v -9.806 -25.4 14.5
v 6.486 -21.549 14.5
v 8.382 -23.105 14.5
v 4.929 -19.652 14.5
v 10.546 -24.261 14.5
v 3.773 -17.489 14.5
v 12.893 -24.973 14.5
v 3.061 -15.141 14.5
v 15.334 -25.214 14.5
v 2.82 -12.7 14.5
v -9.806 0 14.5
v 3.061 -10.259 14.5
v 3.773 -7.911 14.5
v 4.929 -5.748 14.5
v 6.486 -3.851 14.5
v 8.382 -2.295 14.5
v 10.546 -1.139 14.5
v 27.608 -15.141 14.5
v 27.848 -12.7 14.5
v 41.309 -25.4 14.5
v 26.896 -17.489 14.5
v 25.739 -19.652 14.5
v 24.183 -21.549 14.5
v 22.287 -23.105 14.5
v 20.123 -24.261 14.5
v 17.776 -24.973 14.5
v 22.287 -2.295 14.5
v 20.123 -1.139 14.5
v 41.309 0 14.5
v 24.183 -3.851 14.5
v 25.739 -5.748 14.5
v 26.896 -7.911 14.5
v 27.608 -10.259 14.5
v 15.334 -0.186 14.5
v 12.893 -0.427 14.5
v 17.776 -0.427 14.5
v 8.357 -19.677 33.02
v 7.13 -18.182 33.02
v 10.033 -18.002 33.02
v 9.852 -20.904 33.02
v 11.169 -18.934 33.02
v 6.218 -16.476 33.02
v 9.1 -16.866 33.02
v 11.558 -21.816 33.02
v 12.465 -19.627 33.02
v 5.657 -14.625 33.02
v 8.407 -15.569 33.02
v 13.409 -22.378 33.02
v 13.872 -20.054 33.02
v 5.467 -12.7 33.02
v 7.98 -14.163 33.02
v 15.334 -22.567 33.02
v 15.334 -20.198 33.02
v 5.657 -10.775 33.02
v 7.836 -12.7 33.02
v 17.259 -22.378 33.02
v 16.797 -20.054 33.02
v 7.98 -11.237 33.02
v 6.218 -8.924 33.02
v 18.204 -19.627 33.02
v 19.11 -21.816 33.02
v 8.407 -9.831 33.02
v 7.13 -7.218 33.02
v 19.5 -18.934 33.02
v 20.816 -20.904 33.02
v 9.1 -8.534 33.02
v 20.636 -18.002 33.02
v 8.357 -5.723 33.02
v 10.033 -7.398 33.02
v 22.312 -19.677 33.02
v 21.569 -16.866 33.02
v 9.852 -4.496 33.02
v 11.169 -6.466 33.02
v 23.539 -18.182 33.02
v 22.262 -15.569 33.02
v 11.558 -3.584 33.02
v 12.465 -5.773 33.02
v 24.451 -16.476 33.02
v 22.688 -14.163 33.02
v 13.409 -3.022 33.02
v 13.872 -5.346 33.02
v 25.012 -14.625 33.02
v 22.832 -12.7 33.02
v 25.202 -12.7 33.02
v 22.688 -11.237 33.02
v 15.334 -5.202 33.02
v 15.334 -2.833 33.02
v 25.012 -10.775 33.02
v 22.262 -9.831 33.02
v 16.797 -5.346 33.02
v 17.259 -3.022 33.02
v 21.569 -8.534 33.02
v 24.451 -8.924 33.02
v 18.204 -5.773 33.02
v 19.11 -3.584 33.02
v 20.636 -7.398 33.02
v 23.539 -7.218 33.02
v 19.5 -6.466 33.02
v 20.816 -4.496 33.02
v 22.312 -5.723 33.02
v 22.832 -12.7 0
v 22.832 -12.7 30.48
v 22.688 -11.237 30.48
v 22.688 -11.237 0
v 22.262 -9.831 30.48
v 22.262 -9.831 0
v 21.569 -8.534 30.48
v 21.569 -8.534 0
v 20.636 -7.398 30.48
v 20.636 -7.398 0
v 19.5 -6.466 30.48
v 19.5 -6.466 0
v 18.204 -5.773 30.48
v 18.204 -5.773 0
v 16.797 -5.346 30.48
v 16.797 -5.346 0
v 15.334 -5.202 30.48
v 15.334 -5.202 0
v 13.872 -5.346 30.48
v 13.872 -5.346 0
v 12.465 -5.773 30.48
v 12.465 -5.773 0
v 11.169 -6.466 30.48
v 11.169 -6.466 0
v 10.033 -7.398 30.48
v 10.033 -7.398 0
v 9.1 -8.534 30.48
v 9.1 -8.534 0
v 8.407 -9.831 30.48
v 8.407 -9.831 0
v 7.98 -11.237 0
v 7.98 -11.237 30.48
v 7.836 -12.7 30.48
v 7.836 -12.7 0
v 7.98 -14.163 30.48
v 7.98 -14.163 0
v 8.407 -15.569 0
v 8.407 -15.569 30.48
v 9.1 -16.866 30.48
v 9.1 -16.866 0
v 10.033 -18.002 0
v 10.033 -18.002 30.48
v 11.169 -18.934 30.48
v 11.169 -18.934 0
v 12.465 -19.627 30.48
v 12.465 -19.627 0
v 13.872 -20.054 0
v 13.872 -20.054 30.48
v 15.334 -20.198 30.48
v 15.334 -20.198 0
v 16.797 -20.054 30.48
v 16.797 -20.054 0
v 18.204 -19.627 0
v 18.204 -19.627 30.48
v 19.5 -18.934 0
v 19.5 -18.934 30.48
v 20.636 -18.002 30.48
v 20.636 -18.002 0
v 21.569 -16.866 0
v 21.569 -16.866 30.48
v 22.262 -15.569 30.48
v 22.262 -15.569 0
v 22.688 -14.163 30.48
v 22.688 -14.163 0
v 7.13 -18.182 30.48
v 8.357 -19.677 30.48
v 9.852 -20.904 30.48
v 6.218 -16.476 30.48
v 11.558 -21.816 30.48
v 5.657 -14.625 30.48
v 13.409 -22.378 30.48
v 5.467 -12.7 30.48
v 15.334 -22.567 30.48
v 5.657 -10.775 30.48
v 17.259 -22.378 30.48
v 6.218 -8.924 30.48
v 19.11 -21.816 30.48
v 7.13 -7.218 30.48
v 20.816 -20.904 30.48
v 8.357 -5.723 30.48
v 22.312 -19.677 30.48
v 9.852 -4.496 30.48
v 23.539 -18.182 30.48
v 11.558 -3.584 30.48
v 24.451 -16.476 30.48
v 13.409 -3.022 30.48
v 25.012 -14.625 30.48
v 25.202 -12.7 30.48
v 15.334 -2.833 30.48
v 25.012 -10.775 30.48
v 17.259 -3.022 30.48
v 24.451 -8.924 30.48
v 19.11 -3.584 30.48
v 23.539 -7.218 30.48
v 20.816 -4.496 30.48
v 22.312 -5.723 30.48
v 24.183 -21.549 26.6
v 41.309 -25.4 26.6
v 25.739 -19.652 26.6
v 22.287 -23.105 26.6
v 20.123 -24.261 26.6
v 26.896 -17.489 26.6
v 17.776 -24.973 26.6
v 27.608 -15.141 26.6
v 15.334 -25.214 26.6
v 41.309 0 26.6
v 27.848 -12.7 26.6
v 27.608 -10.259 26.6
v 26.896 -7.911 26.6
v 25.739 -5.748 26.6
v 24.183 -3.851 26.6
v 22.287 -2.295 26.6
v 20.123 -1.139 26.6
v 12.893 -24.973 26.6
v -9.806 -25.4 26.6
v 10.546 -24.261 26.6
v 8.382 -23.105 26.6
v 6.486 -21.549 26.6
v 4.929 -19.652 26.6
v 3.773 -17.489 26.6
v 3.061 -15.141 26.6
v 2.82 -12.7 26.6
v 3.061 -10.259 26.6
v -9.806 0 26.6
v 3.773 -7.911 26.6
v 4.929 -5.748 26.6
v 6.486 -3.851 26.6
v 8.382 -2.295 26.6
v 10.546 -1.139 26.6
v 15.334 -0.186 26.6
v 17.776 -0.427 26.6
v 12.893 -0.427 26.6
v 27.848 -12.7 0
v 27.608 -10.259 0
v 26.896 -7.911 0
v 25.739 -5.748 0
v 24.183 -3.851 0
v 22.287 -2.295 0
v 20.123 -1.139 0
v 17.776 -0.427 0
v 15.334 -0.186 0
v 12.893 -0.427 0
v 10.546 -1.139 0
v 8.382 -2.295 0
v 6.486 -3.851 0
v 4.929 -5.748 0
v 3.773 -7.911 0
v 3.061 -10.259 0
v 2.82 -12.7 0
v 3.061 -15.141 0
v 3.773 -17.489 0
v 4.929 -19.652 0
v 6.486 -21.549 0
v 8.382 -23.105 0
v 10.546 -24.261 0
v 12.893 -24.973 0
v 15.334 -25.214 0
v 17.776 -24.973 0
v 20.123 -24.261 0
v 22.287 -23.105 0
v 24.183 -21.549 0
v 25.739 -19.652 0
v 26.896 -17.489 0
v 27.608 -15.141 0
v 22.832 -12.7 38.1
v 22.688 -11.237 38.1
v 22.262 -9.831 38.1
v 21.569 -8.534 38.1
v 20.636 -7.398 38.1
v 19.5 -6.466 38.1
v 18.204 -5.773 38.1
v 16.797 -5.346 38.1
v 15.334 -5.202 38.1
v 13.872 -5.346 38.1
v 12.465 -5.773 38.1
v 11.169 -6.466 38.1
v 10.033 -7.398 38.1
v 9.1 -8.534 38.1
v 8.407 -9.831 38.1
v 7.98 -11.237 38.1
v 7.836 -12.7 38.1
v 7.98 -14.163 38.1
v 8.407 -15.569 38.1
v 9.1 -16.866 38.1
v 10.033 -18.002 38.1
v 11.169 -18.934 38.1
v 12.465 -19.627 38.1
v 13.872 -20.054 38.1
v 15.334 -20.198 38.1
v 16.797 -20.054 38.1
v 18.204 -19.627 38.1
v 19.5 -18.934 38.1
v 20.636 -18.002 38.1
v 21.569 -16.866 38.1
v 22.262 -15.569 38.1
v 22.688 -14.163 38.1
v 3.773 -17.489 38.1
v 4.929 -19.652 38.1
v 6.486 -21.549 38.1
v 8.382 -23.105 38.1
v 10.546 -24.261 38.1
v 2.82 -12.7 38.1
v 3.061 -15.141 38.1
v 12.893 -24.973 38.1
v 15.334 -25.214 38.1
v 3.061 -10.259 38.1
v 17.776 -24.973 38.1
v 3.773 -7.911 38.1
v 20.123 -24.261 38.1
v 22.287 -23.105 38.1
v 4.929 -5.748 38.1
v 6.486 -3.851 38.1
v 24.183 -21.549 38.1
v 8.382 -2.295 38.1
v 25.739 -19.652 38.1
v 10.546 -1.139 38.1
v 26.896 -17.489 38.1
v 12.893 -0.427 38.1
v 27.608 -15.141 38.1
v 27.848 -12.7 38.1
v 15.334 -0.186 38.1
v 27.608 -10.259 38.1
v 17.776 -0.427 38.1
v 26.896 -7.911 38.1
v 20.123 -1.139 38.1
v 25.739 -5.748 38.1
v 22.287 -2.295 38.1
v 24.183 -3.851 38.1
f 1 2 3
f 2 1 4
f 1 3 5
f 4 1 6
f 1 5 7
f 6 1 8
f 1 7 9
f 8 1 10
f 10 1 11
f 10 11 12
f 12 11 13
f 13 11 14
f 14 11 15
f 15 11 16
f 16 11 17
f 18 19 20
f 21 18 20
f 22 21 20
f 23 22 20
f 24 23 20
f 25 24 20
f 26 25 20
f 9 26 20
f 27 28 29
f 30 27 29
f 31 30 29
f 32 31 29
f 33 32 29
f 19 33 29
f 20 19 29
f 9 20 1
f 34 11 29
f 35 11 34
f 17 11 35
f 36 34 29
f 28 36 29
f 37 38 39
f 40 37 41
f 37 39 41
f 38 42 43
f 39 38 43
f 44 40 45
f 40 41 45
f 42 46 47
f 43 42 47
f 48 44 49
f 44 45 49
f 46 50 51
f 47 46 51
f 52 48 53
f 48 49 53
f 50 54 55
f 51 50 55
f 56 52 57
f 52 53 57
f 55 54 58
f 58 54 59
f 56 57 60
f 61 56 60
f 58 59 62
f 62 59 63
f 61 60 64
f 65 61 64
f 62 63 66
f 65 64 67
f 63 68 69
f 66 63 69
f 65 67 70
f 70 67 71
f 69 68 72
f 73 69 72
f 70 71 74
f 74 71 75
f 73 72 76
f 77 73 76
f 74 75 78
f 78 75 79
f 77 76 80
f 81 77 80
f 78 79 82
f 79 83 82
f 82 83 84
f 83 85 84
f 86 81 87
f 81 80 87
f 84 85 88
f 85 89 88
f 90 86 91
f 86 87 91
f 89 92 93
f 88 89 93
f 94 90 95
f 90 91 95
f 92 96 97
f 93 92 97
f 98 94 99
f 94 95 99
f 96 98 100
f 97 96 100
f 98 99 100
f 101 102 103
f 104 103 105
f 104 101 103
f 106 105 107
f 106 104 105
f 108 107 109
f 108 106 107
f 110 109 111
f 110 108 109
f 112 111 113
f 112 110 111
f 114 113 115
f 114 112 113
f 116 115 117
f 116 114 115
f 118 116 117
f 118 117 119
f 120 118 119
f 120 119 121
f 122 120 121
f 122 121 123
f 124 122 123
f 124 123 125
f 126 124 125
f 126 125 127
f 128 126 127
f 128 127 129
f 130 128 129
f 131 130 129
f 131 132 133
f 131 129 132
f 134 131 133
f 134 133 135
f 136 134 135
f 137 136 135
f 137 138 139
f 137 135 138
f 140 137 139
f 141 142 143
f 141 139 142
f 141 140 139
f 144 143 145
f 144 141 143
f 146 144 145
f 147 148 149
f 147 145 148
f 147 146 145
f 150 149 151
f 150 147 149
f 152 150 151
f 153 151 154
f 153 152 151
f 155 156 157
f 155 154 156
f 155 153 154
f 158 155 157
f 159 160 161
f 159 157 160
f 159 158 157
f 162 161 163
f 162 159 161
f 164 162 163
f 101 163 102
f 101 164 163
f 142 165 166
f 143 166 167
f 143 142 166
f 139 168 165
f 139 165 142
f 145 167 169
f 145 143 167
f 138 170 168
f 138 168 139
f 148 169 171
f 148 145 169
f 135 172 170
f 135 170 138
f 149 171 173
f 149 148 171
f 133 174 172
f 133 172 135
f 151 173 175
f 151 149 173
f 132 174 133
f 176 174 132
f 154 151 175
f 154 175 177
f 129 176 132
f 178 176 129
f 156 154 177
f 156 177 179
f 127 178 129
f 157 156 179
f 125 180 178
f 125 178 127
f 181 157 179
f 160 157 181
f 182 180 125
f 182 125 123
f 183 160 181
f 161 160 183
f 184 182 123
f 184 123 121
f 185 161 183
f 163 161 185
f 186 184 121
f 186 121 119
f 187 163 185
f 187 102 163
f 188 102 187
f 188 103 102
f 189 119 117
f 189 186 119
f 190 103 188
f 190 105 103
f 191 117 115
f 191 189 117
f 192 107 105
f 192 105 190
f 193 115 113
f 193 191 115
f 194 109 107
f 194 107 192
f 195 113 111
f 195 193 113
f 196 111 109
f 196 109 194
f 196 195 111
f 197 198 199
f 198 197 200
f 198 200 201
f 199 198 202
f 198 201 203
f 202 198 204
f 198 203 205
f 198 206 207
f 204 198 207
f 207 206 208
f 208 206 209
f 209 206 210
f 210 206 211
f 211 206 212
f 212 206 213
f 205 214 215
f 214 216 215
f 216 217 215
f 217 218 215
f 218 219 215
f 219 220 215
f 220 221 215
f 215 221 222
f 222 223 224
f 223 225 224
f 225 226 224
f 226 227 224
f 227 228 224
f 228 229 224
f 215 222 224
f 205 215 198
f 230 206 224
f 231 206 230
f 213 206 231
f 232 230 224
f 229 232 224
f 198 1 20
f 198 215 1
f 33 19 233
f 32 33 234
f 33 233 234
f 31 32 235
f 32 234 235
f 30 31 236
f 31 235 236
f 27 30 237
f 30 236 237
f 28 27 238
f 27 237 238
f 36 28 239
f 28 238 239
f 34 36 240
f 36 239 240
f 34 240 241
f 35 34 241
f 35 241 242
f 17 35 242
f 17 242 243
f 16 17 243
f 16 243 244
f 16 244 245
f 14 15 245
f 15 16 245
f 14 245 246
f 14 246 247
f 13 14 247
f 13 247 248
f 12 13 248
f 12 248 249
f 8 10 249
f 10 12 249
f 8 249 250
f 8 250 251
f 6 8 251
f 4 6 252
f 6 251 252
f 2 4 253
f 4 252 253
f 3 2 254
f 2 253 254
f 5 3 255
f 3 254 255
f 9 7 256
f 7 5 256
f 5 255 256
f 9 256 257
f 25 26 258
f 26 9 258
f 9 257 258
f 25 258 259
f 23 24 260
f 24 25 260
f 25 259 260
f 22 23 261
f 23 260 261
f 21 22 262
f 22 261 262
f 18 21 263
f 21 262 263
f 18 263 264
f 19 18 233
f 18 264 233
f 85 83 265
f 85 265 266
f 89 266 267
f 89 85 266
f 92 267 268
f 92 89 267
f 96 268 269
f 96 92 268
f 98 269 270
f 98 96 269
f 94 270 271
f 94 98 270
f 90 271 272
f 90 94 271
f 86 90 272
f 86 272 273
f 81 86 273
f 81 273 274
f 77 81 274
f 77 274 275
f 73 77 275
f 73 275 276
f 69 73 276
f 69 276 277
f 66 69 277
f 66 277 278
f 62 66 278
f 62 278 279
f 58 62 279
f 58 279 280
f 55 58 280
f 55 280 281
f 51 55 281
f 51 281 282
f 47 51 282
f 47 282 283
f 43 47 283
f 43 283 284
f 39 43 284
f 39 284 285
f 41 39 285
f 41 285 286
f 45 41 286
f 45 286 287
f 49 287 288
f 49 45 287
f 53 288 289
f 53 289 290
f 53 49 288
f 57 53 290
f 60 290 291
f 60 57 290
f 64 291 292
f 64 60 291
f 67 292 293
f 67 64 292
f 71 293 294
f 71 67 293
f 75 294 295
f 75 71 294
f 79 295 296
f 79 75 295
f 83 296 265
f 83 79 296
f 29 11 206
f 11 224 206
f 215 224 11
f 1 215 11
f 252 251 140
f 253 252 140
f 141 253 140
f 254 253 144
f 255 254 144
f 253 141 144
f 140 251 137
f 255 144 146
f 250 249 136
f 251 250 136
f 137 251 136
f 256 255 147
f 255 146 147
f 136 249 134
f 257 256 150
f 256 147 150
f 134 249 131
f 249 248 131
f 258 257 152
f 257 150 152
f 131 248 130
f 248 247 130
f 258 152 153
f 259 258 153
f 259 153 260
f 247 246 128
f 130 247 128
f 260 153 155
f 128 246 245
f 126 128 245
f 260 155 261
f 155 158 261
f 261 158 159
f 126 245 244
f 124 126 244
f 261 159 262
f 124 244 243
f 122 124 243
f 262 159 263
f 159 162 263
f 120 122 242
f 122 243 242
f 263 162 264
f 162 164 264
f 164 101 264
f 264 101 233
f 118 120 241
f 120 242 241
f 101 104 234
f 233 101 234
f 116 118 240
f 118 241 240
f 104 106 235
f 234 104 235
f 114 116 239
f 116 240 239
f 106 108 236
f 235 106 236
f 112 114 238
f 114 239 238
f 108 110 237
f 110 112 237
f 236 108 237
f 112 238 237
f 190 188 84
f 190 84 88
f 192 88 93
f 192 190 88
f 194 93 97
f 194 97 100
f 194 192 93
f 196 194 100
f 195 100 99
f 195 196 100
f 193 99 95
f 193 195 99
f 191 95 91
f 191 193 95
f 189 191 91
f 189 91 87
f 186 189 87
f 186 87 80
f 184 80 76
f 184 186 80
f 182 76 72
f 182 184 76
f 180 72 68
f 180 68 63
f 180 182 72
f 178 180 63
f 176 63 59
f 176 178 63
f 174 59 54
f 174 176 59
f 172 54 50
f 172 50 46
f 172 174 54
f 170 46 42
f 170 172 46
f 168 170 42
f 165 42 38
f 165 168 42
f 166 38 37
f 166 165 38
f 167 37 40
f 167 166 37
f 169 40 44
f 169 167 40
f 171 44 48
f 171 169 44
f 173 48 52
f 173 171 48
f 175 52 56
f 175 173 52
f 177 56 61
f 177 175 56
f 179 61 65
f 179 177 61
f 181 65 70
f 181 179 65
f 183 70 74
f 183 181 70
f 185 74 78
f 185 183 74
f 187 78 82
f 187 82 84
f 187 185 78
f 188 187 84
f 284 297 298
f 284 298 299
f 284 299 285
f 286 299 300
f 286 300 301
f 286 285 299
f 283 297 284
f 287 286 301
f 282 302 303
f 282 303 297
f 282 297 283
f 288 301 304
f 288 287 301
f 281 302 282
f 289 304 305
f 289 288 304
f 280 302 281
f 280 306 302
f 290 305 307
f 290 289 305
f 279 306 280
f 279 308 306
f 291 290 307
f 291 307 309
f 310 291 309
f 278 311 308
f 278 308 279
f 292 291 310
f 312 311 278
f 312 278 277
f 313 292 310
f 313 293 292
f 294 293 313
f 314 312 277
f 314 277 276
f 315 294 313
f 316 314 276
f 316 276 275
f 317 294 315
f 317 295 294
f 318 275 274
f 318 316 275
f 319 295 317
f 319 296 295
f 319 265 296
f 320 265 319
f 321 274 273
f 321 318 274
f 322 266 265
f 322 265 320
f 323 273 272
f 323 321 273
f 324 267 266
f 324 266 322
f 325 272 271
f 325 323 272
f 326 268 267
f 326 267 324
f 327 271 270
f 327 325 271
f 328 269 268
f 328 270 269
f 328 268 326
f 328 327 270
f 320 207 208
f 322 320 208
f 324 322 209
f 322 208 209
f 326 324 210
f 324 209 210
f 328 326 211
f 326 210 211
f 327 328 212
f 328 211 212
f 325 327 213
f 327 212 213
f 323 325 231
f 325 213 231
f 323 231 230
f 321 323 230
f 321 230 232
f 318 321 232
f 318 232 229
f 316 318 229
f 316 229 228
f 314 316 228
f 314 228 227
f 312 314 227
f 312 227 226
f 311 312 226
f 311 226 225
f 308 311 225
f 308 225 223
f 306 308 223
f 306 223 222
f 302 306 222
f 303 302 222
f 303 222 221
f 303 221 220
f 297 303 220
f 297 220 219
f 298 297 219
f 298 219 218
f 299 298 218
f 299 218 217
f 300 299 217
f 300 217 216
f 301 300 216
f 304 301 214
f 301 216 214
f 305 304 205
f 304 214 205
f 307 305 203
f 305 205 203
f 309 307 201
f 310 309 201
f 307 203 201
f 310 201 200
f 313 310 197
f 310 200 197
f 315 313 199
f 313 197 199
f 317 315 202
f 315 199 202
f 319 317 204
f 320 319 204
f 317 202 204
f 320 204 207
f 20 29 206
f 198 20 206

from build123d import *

# Parameters (mm, degrees)
F1_DEPTH = 25.4
F2_R     = 12.5138914525
F2_R_2   = 7.4979718204
F3_DEPTH = 38.1
F5_START = 30.48
F4_R     = 9.8673928173
F5_DEPTH = 2.54
F6_R     = 7.4979718204
F7_DEPTH = 38.101


with BuildPart() as f1:
    # F0 (on Front) → F1 (new body)
    with BuildSketch(Plane.XZ):
        Polygon((-9.8056579009, 14.4998570904), (0, 14.4998570904), (31.5032890067, 14.4998570904), (41.3089469075, 14.4998570904), (41.3089469075, 26.6004577279), (31.5032890067, 26.6004577279), (0, 26.6004577279), (-9.8056579009, 26.6004577279), align=None)
    extrude(amount=F1_DEPTH)

    # F2 (on Top) → F3 (join)
    with BuildSketch(Plane.XY):
        with Locations((15.3343798593, -12.7)):
            Circle(F2_R)
        with Locations((15.3343798593, -12.7)):
            Circle(F2_R_2, mode=Mode.SUBTRACT)
    extrude(amount=F3_DEPTH)

    # F4 (on Top) → F5 (cut)
    with BuildSketch(Plane.XY.offset(F5_START)):
        with Locations((15.3343798593, -12.7)):
            Circle(F4_R)
    extrude(amount=F5_DEPTH, mode=Mode.SUBTRACT)

    # F6 (on Top) → F7 (cut, through all)
    with BuildSketch(Plane.XY):
        with Locations((15.3343798593, -12.7)):
            Circle(F6_R)
    extrude(amount=F7_DEPTH, mode=Mode.SUBTRACT)


solid = f1.part
